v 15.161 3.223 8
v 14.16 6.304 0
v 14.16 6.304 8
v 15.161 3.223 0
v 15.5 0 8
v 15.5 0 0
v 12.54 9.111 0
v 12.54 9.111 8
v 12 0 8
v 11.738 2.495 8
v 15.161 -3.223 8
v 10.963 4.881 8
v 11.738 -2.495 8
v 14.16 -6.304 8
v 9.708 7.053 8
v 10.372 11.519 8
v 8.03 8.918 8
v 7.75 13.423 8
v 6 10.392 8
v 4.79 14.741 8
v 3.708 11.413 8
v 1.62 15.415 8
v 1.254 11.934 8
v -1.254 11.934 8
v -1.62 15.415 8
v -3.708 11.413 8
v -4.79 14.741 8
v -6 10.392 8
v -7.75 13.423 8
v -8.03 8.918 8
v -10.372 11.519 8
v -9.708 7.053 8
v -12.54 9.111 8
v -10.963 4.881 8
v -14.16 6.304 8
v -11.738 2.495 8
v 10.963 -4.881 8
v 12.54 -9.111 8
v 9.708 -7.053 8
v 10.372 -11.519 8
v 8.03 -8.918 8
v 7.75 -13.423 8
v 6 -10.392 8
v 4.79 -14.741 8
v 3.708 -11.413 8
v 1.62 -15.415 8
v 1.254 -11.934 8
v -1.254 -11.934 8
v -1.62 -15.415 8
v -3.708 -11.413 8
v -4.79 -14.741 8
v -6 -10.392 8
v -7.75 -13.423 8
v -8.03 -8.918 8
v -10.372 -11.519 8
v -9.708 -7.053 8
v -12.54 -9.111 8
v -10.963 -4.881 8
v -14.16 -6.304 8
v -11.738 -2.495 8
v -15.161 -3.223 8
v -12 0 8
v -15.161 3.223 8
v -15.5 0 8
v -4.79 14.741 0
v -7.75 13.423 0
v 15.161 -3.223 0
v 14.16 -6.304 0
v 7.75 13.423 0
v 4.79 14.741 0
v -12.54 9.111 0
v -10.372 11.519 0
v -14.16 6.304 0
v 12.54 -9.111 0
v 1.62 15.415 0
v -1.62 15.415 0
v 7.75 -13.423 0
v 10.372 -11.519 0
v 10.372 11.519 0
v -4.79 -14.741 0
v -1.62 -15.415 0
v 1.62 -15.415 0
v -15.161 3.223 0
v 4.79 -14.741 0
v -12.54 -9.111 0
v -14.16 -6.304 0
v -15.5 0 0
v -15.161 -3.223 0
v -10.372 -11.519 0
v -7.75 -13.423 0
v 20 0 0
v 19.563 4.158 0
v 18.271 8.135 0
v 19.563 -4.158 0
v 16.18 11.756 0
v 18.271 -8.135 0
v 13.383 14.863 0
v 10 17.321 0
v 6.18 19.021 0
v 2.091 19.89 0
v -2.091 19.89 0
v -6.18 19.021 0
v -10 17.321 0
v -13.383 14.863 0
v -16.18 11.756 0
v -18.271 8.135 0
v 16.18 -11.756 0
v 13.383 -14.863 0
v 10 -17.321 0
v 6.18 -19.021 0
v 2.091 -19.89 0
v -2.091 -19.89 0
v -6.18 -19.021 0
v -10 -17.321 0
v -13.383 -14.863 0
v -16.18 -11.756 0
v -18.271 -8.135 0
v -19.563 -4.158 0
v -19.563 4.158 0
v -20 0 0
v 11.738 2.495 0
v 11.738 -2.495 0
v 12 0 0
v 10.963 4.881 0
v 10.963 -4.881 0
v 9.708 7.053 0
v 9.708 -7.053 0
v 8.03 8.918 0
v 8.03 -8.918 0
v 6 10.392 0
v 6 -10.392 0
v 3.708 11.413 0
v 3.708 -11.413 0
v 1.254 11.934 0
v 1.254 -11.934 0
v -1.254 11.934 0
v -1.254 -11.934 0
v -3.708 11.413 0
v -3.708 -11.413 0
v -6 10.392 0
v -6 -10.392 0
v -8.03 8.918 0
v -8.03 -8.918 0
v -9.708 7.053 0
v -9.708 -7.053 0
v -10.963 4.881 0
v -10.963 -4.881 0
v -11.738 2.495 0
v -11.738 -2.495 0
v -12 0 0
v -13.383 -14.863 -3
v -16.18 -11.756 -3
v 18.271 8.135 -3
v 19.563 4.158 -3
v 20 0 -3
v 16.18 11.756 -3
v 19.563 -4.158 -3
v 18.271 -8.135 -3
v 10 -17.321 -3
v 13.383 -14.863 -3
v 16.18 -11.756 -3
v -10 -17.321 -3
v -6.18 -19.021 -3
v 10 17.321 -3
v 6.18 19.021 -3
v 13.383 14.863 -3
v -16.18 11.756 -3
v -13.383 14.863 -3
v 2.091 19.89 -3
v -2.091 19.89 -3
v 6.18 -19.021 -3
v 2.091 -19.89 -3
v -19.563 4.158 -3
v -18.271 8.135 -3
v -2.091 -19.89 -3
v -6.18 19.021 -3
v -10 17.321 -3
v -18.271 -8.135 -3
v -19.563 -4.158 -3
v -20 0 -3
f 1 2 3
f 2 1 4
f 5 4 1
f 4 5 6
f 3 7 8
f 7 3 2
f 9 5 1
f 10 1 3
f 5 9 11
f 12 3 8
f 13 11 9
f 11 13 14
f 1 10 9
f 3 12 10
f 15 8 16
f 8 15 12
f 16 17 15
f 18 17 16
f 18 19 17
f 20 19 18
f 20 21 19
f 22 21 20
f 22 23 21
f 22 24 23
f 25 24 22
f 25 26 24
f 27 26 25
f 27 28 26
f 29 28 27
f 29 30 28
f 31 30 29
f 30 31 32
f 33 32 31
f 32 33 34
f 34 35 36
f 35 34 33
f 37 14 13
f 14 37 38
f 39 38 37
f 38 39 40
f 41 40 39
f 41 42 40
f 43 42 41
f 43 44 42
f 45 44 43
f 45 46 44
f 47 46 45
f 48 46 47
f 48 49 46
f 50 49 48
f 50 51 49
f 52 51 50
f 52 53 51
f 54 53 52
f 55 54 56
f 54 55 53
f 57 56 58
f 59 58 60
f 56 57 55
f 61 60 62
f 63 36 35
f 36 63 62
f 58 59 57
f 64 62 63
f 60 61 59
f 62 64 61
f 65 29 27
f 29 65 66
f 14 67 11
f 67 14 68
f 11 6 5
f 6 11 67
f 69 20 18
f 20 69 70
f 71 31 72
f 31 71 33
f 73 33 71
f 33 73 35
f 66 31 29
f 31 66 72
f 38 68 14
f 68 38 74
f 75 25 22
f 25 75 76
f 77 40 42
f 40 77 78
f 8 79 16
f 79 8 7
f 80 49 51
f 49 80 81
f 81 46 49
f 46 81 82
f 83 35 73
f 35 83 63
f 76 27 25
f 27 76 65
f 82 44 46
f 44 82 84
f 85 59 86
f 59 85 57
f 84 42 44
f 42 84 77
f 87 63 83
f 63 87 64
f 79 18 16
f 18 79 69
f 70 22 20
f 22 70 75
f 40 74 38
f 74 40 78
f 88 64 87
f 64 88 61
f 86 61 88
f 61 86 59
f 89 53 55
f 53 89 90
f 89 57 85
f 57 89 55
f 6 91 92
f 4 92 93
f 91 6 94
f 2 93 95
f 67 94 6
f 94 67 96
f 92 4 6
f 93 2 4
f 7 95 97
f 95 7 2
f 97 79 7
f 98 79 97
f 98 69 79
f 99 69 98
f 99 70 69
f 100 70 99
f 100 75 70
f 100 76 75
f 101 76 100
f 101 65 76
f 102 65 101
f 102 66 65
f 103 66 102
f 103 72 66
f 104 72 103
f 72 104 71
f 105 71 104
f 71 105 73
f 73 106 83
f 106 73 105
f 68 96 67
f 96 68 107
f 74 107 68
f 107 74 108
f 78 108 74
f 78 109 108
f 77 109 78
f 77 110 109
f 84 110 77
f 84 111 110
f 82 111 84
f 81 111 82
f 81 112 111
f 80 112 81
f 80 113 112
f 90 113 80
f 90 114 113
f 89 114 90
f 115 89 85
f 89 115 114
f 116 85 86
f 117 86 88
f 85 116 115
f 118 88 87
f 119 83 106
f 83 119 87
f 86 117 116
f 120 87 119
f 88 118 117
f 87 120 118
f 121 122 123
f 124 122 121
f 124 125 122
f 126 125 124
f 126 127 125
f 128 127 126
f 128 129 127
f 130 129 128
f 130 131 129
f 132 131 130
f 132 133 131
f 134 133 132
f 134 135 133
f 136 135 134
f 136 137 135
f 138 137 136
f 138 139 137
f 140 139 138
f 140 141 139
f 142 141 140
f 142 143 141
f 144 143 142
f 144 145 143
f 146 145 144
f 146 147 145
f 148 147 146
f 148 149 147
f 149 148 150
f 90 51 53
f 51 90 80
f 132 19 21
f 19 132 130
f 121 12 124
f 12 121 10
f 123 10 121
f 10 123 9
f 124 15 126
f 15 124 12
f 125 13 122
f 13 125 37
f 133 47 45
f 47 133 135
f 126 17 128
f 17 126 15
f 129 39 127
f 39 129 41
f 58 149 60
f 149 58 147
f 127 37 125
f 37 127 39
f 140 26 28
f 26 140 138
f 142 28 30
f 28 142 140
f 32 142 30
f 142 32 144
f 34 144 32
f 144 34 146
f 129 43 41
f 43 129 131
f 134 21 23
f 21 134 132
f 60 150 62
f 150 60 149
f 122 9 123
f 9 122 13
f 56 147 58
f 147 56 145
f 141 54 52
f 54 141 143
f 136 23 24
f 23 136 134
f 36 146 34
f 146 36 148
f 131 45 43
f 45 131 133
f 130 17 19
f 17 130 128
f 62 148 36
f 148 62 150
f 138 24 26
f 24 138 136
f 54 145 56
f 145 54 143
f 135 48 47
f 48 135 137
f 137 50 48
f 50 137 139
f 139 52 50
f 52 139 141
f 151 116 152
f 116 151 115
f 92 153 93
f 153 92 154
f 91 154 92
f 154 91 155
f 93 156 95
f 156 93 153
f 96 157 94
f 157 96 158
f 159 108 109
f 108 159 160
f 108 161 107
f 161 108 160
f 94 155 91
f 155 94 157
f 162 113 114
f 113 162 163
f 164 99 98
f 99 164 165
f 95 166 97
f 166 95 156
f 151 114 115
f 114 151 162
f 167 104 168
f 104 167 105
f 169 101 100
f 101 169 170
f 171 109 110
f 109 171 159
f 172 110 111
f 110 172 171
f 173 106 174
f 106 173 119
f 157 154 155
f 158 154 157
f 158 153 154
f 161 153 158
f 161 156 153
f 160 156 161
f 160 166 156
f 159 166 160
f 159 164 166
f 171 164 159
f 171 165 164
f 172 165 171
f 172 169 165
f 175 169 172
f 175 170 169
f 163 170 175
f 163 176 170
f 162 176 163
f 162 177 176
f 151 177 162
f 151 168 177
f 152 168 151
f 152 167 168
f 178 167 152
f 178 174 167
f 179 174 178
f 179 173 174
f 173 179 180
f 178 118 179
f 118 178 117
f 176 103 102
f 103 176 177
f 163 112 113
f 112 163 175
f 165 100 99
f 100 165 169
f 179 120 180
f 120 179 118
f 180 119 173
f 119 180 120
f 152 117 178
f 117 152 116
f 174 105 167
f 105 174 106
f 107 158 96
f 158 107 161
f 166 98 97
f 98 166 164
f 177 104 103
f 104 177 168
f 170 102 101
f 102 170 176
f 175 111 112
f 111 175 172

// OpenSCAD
module chair_foot()
{
    translate([ 0, 0, -3 ]) cylinder(h = 3, r = 20);
    difference()
    {
        cylinder(h = 8, r = 15.5);
        cylinder(h = 30, r = 12, center = true);
    }
}

chair_foot();
